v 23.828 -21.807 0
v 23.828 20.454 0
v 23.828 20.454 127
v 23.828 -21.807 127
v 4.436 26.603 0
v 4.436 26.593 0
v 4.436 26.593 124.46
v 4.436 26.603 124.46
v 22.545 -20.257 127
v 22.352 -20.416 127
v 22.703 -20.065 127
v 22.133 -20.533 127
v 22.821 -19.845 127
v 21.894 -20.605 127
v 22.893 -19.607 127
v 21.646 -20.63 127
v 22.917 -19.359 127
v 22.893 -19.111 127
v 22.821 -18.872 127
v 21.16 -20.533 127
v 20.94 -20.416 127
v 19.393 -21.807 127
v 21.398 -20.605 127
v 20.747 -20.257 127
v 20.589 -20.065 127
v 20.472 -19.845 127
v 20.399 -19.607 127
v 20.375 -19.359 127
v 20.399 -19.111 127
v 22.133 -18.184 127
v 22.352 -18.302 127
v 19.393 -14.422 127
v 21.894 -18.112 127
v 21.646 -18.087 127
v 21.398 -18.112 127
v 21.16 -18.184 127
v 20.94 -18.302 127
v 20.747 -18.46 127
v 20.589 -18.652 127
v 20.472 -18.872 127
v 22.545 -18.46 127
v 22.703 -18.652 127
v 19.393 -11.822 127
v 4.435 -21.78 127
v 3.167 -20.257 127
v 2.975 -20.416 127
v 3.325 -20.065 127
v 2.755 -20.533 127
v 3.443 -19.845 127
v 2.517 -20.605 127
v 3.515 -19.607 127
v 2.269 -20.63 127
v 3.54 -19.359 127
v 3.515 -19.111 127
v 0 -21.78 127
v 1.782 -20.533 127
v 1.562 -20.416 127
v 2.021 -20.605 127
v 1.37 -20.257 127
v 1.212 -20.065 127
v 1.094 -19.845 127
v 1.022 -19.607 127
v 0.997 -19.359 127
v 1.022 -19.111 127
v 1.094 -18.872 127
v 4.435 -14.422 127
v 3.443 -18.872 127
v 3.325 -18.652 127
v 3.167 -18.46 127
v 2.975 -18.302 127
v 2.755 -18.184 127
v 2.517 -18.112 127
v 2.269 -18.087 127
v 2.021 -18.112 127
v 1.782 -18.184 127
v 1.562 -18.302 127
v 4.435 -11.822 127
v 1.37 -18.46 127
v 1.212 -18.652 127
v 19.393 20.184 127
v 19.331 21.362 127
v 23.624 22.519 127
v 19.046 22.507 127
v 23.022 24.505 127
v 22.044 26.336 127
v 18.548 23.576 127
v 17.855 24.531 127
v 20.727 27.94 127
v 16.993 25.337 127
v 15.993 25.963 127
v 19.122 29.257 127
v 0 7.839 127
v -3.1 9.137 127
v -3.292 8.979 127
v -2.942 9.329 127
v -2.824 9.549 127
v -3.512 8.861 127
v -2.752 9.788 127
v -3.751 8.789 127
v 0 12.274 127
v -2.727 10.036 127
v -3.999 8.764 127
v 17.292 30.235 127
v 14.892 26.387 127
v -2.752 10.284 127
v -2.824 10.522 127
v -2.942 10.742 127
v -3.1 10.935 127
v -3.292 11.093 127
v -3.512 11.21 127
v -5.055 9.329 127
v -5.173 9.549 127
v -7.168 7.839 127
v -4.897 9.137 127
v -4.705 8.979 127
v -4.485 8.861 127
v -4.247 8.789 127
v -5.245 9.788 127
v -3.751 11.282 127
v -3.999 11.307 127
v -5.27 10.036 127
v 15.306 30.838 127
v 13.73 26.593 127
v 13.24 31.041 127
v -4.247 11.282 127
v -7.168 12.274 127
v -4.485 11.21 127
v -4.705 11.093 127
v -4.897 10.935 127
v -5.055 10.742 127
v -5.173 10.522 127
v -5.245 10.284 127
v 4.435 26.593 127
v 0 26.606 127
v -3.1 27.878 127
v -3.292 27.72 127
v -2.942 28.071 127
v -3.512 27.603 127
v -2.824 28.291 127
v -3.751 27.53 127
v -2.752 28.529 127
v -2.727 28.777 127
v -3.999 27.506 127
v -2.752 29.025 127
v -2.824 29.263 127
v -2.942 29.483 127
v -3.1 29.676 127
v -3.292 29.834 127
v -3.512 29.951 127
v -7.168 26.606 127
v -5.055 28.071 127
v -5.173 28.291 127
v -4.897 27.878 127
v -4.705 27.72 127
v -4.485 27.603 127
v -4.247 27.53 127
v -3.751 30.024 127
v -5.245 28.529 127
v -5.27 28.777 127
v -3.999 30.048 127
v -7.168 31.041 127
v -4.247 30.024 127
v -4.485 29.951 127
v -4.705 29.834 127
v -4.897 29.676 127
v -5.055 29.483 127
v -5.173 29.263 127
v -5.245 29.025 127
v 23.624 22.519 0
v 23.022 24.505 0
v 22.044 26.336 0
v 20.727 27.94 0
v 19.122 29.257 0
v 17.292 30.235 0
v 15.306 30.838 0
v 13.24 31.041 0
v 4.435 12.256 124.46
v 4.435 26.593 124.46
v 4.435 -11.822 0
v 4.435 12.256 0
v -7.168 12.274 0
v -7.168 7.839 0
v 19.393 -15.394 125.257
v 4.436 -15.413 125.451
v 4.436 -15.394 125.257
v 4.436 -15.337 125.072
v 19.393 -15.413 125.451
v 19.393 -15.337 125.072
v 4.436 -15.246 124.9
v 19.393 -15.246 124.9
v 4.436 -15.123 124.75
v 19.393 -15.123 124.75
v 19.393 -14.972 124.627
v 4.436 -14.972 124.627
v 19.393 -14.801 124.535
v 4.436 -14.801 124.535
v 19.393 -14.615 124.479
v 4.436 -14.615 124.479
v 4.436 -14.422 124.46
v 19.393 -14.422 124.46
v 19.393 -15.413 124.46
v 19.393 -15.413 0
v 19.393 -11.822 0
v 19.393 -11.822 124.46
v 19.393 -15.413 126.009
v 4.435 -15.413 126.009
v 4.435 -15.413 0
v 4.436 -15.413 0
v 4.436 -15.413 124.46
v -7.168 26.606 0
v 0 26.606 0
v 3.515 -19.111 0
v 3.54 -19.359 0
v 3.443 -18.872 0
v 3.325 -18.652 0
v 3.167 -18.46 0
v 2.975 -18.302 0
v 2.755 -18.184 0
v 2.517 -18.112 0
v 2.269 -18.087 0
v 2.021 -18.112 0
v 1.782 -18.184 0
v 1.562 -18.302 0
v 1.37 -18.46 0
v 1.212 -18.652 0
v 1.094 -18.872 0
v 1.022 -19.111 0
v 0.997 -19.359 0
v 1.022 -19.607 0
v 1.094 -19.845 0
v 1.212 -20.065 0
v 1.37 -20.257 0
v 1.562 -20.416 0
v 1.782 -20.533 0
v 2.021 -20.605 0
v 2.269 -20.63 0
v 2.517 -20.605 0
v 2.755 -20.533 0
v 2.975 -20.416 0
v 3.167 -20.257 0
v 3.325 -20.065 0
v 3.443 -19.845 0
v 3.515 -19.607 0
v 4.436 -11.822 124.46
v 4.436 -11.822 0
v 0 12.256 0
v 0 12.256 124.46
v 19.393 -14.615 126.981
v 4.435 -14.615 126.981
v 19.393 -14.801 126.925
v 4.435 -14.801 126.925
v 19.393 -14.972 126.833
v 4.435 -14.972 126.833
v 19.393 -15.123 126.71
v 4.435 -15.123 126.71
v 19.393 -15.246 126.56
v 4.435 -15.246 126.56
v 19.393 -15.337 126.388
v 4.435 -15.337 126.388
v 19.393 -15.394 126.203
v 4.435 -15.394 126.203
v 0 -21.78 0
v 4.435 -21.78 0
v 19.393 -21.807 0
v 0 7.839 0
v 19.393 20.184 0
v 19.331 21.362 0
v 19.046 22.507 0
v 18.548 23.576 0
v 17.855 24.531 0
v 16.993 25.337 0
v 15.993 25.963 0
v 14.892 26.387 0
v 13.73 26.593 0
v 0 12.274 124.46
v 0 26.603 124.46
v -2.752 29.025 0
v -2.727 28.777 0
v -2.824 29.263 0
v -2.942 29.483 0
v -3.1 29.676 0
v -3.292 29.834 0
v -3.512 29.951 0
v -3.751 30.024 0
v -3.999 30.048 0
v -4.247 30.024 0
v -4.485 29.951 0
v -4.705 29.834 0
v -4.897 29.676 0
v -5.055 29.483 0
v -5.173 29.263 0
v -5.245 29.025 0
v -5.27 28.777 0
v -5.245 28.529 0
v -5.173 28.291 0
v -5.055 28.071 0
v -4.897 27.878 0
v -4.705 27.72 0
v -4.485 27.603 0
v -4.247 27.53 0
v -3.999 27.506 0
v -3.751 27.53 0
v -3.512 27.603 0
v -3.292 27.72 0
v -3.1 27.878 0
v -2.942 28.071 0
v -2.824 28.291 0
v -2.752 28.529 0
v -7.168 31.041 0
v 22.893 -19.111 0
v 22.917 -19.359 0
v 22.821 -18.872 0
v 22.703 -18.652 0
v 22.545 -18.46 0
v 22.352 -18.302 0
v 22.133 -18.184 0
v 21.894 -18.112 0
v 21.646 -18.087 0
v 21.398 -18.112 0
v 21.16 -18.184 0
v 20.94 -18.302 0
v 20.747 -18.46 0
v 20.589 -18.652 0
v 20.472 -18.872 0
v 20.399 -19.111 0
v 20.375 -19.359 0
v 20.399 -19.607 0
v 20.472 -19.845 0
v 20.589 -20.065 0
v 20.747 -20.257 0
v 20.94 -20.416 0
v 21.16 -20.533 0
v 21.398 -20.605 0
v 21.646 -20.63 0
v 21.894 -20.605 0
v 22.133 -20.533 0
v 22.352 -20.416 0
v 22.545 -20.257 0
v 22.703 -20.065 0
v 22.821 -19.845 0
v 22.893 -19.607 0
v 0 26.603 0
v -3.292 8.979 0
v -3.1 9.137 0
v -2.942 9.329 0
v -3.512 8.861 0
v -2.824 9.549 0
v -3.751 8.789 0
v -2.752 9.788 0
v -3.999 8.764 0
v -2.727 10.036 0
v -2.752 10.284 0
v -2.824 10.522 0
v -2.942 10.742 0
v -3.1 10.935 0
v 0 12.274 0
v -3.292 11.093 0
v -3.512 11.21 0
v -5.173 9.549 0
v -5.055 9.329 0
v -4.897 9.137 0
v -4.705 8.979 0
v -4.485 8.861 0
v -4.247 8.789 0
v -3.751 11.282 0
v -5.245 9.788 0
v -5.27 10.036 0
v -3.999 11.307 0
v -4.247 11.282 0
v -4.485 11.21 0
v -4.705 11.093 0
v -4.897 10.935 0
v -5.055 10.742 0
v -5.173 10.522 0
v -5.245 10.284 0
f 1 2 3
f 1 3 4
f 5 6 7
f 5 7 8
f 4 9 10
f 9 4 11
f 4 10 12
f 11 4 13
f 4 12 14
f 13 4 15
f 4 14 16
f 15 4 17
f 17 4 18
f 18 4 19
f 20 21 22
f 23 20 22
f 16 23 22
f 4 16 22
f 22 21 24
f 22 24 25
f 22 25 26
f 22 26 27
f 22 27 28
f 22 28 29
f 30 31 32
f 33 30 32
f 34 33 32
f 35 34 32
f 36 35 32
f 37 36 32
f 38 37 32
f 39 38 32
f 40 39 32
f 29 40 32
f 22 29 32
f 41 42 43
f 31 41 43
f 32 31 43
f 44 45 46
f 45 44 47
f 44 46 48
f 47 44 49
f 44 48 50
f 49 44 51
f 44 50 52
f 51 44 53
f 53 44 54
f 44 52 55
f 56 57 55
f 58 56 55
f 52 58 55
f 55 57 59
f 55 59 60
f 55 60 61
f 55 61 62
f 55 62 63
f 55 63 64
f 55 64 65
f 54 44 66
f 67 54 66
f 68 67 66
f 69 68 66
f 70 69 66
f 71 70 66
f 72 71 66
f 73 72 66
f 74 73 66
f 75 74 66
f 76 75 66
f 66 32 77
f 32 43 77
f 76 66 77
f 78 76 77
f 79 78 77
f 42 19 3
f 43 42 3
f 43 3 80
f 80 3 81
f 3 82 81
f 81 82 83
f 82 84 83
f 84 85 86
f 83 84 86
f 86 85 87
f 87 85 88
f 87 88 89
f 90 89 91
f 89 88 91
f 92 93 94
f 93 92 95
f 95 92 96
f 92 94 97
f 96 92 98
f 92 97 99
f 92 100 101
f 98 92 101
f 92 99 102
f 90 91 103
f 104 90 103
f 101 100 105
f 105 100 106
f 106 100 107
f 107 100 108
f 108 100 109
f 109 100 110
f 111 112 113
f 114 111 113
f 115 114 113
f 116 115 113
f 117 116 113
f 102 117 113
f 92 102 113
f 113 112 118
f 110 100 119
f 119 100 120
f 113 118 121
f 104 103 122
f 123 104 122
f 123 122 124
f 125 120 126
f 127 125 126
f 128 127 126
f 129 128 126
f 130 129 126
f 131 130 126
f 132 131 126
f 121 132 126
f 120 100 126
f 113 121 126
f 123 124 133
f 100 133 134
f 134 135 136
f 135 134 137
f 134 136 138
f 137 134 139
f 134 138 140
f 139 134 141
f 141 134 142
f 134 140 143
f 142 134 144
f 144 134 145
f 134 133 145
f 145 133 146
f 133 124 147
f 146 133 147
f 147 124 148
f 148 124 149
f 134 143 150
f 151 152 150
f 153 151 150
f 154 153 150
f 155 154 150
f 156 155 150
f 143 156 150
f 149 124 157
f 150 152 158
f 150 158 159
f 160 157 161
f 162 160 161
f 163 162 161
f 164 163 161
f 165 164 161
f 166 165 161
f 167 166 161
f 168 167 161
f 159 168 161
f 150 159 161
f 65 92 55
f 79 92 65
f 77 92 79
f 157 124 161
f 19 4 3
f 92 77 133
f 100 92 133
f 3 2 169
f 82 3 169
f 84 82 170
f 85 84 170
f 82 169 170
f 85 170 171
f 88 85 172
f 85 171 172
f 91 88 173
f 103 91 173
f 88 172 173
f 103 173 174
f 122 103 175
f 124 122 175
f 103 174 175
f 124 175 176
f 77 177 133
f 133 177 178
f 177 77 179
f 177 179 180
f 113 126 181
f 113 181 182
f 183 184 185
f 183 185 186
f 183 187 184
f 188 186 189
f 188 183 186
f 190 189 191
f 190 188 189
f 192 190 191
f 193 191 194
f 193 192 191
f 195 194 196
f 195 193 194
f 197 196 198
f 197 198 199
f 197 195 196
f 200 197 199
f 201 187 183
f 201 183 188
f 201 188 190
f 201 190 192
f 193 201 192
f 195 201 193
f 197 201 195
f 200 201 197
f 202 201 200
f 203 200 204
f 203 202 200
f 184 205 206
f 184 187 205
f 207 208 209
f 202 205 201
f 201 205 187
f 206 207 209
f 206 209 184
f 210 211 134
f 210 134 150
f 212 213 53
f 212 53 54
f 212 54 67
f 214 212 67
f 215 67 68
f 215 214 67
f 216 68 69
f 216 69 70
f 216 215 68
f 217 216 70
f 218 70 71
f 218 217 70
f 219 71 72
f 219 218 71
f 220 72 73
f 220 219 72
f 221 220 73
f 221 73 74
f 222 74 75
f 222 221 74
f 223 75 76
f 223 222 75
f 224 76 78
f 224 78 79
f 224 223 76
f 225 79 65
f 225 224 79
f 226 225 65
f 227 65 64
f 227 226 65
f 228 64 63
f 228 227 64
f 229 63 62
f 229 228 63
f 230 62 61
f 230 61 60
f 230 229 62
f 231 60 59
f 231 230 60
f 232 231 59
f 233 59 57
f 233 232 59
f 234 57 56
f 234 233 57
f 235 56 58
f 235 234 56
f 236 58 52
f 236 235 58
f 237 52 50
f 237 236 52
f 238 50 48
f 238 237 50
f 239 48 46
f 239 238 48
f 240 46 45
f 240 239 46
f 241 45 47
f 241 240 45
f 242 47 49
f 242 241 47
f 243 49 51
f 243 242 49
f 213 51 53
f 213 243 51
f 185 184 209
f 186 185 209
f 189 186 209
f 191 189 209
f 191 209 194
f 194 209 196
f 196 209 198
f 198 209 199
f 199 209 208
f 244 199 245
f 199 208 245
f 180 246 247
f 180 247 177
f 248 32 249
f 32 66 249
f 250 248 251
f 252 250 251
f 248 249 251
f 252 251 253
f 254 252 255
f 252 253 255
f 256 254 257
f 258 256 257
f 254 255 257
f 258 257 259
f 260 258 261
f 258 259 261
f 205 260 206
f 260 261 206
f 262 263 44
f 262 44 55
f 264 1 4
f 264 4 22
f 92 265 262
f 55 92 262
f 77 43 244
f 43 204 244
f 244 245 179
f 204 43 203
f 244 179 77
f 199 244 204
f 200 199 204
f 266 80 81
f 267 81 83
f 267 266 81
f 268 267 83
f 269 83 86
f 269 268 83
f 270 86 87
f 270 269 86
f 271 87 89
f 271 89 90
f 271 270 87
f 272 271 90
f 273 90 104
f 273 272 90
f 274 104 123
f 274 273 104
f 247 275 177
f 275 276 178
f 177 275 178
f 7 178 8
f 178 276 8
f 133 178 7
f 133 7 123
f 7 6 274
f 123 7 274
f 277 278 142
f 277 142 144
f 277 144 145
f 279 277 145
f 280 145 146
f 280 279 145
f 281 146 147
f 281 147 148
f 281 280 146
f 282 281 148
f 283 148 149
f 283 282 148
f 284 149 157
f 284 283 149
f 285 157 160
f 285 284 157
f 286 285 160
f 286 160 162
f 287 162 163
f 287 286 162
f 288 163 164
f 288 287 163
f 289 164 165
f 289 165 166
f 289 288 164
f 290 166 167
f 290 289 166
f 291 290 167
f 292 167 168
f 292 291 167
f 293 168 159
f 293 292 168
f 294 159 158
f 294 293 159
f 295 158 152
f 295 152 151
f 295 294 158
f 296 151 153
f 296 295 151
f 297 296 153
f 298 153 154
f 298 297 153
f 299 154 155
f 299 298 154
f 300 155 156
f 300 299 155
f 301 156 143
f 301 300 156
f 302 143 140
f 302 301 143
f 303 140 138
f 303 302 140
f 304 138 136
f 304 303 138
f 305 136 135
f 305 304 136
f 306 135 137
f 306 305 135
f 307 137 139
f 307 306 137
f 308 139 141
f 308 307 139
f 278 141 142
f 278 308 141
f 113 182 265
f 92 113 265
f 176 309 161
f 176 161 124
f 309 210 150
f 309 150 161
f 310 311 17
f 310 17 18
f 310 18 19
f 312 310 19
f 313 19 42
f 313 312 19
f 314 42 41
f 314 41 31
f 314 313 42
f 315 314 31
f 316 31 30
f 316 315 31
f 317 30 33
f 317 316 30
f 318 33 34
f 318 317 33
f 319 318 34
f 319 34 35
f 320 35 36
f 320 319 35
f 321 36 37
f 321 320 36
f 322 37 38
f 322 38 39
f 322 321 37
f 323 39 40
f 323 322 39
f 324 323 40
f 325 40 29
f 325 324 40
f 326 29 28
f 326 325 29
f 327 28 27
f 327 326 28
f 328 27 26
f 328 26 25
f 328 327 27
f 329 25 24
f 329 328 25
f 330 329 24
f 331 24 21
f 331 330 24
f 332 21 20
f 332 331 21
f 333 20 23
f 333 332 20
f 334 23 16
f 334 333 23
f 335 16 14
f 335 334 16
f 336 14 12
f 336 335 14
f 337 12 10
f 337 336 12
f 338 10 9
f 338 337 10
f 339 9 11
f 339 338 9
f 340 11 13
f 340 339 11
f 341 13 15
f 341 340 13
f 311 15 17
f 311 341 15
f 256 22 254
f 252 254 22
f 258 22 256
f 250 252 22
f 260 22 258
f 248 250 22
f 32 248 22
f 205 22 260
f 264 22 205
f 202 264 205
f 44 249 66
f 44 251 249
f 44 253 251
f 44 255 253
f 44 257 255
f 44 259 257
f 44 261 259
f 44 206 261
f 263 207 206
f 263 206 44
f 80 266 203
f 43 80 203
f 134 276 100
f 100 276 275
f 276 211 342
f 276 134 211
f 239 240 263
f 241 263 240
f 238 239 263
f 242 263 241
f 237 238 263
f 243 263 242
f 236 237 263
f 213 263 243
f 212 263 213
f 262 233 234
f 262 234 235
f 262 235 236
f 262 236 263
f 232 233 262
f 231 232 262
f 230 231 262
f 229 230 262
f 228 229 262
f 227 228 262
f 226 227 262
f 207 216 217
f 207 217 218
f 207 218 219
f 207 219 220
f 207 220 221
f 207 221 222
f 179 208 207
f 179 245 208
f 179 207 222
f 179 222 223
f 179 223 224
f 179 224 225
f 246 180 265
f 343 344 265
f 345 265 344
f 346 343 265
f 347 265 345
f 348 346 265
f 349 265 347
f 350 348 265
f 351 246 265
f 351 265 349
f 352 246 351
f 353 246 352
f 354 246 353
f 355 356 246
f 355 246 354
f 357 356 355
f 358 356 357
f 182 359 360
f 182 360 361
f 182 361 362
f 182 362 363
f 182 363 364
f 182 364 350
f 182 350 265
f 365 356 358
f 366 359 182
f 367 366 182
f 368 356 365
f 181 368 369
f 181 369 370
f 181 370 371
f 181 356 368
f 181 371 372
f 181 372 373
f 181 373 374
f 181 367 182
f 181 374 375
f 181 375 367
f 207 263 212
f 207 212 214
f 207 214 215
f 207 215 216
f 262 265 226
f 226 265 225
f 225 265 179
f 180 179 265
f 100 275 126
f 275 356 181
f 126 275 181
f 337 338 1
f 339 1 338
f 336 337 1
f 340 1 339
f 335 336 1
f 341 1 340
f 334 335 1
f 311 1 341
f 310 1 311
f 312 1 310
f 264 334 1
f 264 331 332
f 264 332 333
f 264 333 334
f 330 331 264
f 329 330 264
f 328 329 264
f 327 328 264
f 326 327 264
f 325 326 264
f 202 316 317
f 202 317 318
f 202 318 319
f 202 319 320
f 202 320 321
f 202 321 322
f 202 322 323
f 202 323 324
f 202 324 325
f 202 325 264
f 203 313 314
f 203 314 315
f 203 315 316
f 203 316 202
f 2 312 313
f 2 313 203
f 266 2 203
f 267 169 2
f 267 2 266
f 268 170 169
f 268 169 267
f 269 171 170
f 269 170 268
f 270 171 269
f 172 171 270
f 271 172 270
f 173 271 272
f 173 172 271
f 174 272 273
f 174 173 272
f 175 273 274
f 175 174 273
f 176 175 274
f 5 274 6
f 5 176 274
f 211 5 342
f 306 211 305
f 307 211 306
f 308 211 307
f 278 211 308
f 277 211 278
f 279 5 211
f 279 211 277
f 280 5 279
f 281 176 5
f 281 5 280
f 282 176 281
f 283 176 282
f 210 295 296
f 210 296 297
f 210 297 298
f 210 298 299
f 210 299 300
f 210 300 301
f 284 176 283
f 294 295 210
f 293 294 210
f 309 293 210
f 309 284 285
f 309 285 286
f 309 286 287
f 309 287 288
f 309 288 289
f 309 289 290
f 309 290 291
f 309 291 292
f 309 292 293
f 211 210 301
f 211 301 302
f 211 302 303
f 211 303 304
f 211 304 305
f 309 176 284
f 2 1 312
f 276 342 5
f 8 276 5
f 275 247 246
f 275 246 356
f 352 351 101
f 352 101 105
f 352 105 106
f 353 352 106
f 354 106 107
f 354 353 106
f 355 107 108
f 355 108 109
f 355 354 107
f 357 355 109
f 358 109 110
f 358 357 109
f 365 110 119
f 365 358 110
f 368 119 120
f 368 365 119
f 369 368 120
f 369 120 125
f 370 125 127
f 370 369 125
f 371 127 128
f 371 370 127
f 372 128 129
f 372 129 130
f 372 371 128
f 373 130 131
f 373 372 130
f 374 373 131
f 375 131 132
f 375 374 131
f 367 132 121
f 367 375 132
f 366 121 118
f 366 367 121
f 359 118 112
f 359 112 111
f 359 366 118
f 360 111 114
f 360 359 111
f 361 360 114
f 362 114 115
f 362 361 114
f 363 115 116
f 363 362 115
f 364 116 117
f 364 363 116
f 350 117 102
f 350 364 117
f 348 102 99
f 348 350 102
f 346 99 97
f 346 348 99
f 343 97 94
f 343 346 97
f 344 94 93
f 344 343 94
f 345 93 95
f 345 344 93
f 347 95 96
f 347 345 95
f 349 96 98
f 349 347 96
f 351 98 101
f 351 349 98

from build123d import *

# Parameters (mm, degrees)
SKETCH_R      = 1.2711848232
PAD_DEPTH     = 127
SKETCH001_W   = 4.436103
SKETCH001_H   = 14.34748
SKETCH001_W_2 = 14.95671
SKETCH001_H_2 = 3.590976
POCKET_DEPTH  = 124.46
FILLET_R      = 0.9906


with BuildPart() as part:
    # Sketch → Pad (new body)
    with BuildSketch(Plane.XY):
        with BuildLine():
            Line((0, 26.6062828995), (-7.1678815, 26.6062828995))
            Line((-7.1678815, 26.6062828995), (-7.1678815, 31.0413108508))
            Line((-7.1678815, 31.0413108508), (13.2402945255, 31.0413108508))
            ThreePointArc((23.8278416124, 20.4537623186), (20.7268209545, 27.9402891709), (13.2402945255, 31.0413108508))
            Line((23.8278416124, 20.4537623186), (23.8278416124, -21.8071686959))
            Line((23.8278416124, -21.8071686959), (19.392813661, -21.8071686959))
            Line((19.392813661, -21.8071686959), (19.392813661, -15.4126492598))
            Line((19.392813661, -15.4126492598), (4.4350279514, -15.4126492598))
            Line((4.4350279514, -15.4126492598), (4.4350279514, -21.7800391169))
            Line((4.4350279514, -21.7800391169), (0, -21.7800391169))
            Line((0, 7.8389965784), (0, -21.7800391169))
            Line((-7.1678815, 7.8389965784), (0, 7.8389965784))
            Line((-7.1678815, 12.2740245298), (-7.1678815, 7.8389965784))
            Line((0, 12.2740245298), (-7.1678815, 12.2740245298))
            Line((0, 26.6062828995), (0, 12.2740245298))
        make_face()
        with Locations((-3.998539, 28.777004)):
            Circle(SKETCH_R, mode=Mode.SUBTRACT)
        with Locations((-3.998539, 10.035677)):
            Circle(SKETCH_R, mode=Mode.SUBTRACT)
        with Locations((2.268514, -19.358597)):
            Circle(SKETCH_R, mode=Mode.SUBTRACT)
        with Locations((21.646236, -19.358597)):
            Circle(SKETCH_R, mode=Mode.SUBTRACT)
        with BuildLine():
            Line((19.392813661, 20.1836425457), (19.392813661, -11.8216736282))
            Line((19.392813661, -11.8216736282), (4.4350279514, -11.8216736282))
            Line((4.4350279514, -11.8216736282), (4.4350279514, 26.5926766868))
            Line((4.4350279514, 26.5926766868), (13.7303997721, 26.5926766868))
            ThreePointArc((19.392813661, 20.1836425457), (17.8554912262, 24.5313130863), (13.7303997721, 26.5926766868))
        make_face(mode=Mode.SUBTRACT)
    extrude(amount=PAD_DEPTH)

    # Sketch001 → Pocket (cut)
    with BuildSketch(Plane.XY):
        with Locations((2.2180515, 19.42961)):
            Rectangle(SKETCH001_W, SKETCH001_H)
        with Locations((11.914458, -13.617161)):
            Rectangle(SKETCH001_W_2, SKETCH001_H_2)
    extrude(amount=POCKET_DEPTH, mode=Mode.SUBTRACT)

    # Fillet
    fillet_edges = [part.edges().sort_by_distance(p)[0] for p in [
        (11.914458, -15.412649, 124.46),
        (11.913921, -15.412649, 127),
    ]]
    fillet(fillet_edges, radius=FILLET_R)


solid = part.part
